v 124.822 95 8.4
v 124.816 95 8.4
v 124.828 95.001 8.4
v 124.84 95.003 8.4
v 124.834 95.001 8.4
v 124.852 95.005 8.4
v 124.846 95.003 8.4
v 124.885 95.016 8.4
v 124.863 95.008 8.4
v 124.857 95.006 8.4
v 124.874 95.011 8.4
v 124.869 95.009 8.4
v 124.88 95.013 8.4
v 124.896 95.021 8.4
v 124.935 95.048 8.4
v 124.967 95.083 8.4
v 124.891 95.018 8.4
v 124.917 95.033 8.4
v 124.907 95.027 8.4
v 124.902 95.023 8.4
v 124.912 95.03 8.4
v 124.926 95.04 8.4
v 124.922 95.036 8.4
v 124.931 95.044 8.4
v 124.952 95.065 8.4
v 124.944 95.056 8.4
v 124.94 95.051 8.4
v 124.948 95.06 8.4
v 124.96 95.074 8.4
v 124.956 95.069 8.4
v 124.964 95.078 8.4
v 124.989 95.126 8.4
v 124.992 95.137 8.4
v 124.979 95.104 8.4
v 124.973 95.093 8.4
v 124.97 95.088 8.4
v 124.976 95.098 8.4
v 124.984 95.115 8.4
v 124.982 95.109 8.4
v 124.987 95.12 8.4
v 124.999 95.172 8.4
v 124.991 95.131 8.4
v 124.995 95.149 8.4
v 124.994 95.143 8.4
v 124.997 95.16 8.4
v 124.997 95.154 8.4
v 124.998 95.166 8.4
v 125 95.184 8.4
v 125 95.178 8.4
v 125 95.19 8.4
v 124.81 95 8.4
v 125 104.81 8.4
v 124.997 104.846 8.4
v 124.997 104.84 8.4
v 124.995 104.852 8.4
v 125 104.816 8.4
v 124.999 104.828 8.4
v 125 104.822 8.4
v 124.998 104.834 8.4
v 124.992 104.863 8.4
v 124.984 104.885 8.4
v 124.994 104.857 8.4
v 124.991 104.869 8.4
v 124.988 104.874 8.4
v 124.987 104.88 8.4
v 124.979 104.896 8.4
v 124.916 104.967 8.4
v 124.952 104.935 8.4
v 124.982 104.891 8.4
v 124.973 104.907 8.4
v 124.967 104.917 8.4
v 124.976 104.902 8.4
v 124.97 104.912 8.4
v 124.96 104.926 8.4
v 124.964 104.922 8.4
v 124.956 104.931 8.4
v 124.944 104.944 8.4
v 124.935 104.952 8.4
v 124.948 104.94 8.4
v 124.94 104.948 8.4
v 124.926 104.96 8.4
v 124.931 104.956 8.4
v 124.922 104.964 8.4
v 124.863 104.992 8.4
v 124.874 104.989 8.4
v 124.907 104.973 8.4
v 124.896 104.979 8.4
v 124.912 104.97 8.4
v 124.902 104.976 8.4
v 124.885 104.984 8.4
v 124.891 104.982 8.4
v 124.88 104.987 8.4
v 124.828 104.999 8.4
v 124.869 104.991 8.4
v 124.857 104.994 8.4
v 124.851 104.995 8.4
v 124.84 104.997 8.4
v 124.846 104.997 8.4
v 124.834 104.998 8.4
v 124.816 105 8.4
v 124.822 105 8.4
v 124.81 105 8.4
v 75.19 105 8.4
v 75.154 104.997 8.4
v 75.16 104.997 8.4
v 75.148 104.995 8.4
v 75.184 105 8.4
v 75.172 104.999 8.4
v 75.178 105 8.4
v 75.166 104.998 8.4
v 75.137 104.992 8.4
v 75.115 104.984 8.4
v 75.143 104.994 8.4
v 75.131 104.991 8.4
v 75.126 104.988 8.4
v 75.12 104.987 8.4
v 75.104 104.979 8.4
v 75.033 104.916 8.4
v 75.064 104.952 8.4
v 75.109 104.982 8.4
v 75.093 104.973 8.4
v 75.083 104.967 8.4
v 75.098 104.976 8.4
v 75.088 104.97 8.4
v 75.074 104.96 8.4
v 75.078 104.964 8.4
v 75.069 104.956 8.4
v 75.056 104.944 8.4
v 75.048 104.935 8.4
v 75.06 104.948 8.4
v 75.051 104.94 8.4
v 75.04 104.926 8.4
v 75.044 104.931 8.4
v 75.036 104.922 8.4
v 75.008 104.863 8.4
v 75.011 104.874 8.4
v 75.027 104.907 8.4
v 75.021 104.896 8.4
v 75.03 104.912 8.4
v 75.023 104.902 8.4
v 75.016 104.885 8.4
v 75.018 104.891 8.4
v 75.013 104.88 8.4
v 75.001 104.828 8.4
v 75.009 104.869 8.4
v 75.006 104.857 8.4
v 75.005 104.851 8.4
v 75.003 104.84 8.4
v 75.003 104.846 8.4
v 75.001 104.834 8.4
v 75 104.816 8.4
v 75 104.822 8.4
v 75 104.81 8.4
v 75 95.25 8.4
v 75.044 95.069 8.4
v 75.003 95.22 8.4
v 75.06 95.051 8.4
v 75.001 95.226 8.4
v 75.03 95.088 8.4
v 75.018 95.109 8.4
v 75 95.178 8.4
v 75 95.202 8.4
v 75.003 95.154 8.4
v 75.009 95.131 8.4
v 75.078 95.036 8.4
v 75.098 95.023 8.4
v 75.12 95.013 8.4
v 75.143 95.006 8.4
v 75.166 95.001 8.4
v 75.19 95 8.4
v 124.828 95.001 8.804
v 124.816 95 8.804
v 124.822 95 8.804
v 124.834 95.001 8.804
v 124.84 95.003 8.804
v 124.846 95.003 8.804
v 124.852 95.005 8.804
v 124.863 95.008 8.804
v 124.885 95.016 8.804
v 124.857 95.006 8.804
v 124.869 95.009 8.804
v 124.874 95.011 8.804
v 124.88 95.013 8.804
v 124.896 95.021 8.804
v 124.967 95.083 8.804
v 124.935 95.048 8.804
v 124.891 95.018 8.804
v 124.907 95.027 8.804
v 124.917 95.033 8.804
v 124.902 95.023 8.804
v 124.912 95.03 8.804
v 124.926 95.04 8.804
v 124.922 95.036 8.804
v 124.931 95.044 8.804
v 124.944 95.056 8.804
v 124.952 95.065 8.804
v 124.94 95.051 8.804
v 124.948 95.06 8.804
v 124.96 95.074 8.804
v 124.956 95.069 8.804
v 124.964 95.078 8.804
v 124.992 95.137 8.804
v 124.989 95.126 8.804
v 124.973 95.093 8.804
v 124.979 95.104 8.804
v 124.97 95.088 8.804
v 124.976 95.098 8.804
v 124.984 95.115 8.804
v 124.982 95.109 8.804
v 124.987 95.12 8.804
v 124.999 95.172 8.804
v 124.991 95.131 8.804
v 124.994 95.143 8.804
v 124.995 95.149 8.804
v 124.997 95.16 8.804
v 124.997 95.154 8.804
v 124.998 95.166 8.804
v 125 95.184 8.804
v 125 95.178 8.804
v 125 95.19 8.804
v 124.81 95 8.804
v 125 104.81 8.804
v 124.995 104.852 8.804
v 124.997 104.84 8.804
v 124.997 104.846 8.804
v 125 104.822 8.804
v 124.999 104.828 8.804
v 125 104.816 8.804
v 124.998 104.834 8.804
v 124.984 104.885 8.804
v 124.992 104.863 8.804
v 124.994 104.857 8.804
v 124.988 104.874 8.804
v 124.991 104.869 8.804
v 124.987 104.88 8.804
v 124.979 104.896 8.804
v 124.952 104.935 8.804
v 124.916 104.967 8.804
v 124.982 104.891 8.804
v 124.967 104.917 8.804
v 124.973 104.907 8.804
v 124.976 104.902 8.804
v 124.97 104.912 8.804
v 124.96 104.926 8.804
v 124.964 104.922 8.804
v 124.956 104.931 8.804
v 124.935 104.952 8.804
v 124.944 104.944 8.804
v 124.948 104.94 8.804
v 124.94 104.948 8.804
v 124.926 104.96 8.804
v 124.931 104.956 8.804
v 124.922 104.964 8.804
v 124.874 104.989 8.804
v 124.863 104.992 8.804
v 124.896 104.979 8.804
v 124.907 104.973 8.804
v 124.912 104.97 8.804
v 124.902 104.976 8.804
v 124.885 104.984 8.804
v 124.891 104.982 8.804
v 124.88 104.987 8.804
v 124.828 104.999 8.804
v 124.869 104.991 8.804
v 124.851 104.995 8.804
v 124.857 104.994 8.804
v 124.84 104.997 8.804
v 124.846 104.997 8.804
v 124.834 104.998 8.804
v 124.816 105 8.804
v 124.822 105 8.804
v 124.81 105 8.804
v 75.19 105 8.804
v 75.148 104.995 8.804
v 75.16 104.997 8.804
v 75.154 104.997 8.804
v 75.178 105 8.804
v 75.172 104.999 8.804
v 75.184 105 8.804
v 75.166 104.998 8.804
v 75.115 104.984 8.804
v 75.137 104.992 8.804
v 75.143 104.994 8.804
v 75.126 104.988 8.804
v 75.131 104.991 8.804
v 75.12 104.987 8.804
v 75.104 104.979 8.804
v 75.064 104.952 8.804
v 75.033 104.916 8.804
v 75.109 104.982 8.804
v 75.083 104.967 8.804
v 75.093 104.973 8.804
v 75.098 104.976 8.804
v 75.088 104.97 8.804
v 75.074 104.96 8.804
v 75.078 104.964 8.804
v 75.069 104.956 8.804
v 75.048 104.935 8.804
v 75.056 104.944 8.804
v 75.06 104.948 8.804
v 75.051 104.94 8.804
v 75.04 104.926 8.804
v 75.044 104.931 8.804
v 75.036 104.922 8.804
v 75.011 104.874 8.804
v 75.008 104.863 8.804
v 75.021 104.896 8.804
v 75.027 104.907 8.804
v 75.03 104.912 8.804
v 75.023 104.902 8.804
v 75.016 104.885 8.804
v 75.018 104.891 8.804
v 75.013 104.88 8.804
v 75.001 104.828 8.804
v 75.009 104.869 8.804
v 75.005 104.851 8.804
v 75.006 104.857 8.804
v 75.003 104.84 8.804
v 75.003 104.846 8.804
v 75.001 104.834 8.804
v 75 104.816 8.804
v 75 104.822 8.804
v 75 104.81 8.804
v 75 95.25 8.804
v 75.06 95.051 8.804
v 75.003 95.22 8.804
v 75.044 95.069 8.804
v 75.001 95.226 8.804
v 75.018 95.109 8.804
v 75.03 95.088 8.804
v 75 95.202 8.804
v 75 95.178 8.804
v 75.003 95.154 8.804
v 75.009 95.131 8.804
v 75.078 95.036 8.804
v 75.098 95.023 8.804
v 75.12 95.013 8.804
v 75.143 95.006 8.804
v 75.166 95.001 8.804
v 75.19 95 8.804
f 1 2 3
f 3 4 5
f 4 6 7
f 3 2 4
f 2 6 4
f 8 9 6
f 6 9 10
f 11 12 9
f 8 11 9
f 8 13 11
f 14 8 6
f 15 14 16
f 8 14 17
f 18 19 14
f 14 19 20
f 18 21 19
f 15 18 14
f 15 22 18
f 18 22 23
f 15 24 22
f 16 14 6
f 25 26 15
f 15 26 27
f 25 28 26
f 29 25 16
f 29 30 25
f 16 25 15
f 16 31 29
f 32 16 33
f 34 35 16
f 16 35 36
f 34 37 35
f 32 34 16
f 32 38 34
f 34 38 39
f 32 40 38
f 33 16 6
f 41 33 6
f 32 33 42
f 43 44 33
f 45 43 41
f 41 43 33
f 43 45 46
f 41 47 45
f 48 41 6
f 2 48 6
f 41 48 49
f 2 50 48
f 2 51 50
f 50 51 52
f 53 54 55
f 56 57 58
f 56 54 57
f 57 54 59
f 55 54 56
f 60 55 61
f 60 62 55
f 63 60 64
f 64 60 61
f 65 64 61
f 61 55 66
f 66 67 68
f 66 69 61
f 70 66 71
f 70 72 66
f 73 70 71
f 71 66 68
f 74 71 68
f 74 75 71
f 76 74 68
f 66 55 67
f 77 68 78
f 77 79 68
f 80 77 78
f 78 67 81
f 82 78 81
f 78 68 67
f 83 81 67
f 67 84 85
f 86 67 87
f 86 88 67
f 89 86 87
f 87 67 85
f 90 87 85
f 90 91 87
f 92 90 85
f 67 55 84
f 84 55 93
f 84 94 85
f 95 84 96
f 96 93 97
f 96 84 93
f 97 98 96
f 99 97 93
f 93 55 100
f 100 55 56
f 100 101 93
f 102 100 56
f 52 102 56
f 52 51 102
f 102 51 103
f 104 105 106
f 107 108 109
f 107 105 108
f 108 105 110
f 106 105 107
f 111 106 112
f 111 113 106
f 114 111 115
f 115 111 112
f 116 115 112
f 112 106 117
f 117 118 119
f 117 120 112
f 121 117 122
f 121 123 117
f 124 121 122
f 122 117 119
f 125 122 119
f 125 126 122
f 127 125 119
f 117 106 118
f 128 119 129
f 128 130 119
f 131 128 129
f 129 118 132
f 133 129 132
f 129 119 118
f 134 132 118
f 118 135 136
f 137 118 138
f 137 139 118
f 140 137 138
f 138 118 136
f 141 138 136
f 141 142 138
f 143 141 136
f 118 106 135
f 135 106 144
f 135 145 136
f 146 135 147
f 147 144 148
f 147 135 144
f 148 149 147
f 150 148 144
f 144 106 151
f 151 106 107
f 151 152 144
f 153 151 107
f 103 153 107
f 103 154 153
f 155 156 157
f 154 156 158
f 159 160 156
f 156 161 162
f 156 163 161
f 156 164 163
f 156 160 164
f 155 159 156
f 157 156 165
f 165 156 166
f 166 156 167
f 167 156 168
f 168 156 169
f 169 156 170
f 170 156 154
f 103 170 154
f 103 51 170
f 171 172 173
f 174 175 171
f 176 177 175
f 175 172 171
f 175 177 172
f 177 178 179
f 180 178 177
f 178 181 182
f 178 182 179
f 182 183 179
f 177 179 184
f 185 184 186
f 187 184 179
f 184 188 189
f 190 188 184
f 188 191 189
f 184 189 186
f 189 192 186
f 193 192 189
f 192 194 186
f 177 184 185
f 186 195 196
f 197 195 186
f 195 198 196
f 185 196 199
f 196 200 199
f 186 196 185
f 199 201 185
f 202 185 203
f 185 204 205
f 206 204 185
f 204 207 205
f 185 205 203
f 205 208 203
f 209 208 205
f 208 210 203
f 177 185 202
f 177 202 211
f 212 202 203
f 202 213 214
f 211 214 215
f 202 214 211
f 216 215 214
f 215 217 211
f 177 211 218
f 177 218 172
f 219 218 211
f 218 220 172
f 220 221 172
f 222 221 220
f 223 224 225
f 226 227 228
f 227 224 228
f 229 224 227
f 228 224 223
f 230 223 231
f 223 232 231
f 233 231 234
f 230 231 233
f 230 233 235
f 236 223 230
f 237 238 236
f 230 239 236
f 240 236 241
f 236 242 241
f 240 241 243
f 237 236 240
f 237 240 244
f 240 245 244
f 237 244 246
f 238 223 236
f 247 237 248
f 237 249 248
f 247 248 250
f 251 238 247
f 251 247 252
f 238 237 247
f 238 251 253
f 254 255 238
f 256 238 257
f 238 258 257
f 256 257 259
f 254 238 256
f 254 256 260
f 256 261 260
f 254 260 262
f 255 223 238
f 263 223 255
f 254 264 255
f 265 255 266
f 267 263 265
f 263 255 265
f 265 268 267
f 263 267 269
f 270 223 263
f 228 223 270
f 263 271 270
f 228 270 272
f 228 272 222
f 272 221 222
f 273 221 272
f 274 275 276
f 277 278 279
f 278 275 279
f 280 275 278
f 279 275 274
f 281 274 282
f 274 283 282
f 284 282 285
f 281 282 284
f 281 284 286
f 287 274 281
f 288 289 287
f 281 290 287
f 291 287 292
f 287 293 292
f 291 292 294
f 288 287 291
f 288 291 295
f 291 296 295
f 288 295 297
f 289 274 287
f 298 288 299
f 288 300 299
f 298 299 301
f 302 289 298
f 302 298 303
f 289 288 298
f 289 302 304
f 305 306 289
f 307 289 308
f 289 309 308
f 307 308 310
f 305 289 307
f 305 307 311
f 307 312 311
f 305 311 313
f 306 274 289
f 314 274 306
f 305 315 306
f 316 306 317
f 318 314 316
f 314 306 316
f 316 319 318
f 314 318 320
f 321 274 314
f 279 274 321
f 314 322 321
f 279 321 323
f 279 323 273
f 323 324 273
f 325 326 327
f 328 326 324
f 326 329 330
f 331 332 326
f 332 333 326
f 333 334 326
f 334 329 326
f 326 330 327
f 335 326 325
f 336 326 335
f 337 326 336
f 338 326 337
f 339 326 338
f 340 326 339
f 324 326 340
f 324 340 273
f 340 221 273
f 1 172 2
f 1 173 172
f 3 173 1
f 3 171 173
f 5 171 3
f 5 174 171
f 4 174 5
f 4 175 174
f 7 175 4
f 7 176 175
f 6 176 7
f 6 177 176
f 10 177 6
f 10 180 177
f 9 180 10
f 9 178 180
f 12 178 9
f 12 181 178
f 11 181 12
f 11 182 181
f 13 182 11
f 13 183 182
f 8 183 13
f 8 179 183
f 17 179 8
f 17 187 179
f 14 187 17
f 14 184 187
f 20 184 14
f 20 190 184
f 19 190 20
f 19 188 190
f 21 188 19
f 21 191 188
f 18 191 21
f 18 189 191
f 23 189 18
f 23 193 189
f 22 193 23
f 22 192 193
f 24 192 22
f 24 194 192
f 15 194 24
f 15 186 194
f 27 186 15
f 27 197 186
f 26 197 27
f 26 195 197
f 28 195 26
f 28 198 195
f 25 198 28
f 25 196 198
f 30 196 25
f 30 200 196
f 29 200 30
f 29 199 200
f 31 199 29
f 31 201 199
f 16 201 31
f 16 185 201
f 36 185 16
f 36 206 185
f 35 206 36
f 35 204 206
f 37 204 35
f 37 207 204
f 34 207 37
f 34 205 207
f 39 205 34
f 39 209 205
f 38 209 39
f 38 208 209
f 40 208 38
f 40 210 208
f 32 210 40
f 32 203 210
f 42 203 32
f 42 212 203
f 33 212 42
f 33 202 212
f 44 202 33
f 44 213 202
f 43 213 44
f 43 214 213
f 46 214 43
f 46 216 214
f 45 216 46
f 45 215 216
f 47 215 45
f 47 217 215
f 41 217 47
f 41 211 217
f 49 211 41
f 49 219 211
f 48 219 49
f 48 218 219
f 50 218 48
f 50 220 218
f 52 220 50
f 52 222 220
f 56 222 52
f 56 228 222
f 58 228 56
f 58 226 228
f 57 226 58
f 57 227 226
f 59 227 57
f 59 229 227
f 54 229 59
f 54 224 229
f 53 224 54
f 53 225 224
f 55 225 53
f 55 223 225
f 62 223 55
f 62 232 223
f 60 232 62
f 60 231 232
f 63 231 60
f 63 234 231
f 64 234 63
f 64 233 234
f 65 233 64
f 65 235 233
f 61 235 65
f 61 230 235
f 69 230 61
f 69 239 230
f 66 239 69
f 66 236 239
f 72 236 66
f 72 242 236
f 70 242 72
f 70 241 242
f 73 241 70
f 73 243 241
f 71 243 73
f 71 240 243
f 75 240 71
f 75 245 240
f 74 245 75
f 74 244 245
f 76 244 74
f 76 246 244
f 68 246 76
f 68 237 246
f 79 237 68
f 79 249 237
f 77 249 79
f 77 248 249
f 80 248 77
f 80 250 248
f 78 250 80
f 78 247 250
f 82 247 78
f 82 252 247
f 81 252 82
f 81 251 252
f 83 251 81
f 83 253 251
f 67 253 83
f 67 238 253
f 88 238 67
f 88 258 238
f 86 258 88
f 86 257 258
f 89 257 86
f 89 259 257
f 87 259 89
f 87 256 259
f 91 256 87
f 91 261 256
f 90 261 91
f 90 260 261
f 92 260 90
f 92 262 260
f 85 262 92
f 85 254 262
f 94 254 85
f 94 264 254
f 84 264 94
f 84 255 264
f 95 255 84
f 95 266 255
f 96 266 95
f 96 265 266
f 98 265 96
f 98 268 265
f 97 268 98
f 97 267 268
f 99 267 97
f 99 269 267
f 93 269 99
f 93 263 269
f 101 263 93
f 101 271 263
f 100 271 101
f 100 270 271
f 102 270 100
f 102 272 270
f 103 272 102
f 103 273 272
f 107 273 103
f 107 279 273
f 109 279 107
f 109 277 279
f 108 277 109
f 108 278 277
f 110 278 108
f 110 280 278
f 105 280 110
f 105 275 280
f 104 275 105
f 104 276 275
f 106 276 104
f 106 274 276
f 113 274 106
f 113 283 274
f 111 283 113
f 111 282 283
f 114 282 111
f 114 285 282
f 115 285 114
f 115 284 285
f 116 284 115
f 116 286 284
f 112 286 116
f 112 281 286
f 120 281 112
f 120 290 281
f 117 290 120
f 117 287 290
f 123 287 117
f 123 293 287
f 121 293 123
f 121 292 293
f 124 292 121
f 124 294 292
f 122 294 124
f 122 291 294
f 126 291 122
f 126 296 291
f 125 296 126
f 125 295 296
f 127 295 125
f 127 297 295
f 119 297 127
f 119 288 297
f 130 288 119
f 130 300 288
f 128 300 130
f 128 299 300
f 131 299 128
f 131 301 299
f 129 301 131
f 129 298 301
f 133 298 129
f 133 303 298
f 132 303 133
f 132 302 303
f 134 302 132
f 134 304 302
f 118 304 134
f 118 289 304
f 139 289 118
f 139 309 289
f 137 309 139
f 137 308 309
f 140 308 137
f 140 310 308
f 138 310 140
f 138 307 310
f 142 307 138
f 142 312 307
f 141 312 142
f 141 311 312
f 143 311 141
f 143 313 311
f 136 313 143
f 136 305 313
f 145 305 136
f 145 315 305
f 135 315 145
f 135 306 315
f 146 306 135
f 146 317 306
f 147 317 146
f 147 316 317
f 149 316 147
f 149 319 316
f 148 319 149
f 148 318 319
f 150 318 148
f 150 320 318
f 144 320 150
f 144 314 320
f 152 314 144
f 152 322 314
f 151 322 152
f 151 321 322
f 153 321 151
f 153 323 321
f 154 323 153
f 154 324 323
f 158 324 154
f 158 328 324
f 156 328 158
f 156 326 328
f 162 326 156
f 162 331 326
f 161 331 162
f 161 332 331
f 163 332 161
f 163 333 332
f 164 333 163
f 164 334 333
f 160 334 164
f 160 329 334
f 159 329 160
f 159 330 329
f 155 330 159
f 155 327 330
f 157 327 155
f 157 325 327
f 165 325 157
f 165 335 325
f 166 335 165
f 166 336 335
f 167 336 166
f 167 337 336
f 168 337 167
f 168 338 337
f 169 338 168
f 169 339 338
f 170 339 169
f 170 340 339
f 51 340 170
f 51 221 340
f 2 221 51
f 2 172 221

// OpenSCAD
module drawBasicShape(x1, y1, x2, y2, width)
{
	length = sqrt((x1-x2)*(x1-x2) + (y1-y2)*(y1-y2));
	if (width!=0.0) {
		square(size = [width, length], center = false);
		translate([width/2.0, 0, 0]) circle(d=width);
		translate([width/2.0, length, 0]) circle(d=width);
	}
}

module translateAndRotate(x1, y1, x2, y2, width)
{
	if (width != 0.0) {
		angle = atan((y2-y1)/(x2-x1)) +270;
		if (x2>=x1) {
			translate([x1, y1, 0.0]) rotate([0.0, 0.0, angle]) translate([-width/2.0, 0.0, 0.0]) scale([1.0, 1.0, 1.0]) drawBasicShape(x1, y1, x2, y2, width);
		}
		else {
			translate([x1, y1, 0.0]) rotate([0.0, 0.0, angle+180]) translate([-width/2.0, 0.0, 0.0]) scale([1.0, 1.0, 1.0]) drawBasicShape(x1, y1, x2, y2, width);		}
	}
}

$fn=50;

points20 = [
[75.77800000, 95.77800000, 0.00000000],
[124.22200000, 95.77800000, 0.37999548],
[124.22200000, 104.22200000, 0.37997788],
[75.77800000, 104.22200000, 0.37999672],
[75.77800000, 95.83800000, 0.37997423],
[75.48400000, 95.48400000, 0.00000000],
[124.51600000, 95.48400000, 0.37999868],
[124.51600000, 104.51600000, 0.37998977],
[75.48400000, 104.51600000, 0.37999746],
[75.48400000, 95.54400000, 0.37999314],
[75.19000000, 95.19000000, 0.00000000],
[124.81000000, 95.19000000, 0.37999939],
[124.81000000, 104.81000000, 0.38000021],
[75.19000000, 104.81000000, 0.38000060],
[75.19000000, 95.25000000, 0.37999715],
[75.53600000, 95.39000000, 0.00000000],
[75.94600000, 103.88900000, 0.00000000],
[76.11100000, 104.05400000, 0.37961375],
[76.52800000, 104.05400000, 0.38001190],
[75.94600000, 103.47200000, 0.37989934],
[75.94600000, 103.05500000, 0.38015610],
[76.94500000, 104.05400000, 0.37994651],
[77.36200000, 104.05400000, 0.38001190],
[75.94600000, 102.63800000, 0.37999592],
[75.94600000, 102.22100000, 0.38001190],
[77.77900000, 104.05400000, 0.37999966],
[78.19600000, 104.05400000, 0.38015610],
[75.94600000, 101.80400000, 0.38000201],
[75.94600000, 101.38700000, 0.38001190],
[78.61300000, 104.05400000, 0.38001957],
[79.03000000, 104.05400000, 0.38001190],
[75.94600000, 100.97000000, 0.38001859],
[75.94600000, 100.55300000, 0.38001190],
[79.44700000, 104.05400000, 0.38002999],
[79.86400000, 104.05400000, 0.38001190],
[75.94600000, 100.13600000, 0.38002811],
[75.94600000, 99.71900000, 0.38001190],
[80.28100000, 104.05400000, 0.38002660],
[80.69800000, 104.05400000, 0.38001190],
[75.94600000, 99.30200000, 0.38003429],
[75.94600000, 98.88500000, 0.38001190],
[81.11500000, 104.05400000, 0.38003252],
[81.53300000, 104.05400000, 0.37930814],
[75.94600000, 98.46700000, 0.37997836],
[75.94600000, 98.05000000, 0.38001190],
[81.95000000, 104.05400000, 0.37998072],
[82.36700000, 104.05400000, 0.38015610],
[75.94600000, 97.63300000, 0.37998277],
[75.94600000, 97.21600000, 0.38015610],
[82.78400000, 104.05400000, 0.37999079],
[83.20100000, 104.05400000, 0.38001190],
[75.94600000, 96.79900000, 0.37999203],
[75.94600000, 96.38200000, 0.38001190],
[83.61800000, 104.05400000, 0.37999868],
[84.03500000, 104.05400000, 0.38001190],
[75.95600000, 95.97600000, 0.38000275],
[76.34400000, 95.94600000, 0.37958004],
[84.45200000, 104.05400000, 0.38000754],
[84.86900000, 104.05400000, 0.38001190],
[76.76100000, 95.94600000, 0.38000229],
[77.17800000, 95.94600000, 0.38001190],
[85.28600000, 104.05400000, 0.38000754],
[85.70300000, 104.05400000, 0.38001190],
[77.59500000, 95.94600000, 0.38000229],
[78.01200000, 95.94600000, 0.38015610],
[86.12000000, 104.05400000, 0.38000229],
[86.53700000, 104.05400000, 0.38001190],
[78.42900000, 95.94600000, 0.38000754],
[78.84600000, 95.94600000, 0.38001190],
[86.95400000, 104.05400000, 0.38000229],
[87.37100000, 104.05400000, 0.38001190],
[79.26300000, 95.94600000, 0.38000754],
[79.68000000, 95.94600000, 0.38001190],
[87.78900000, 104.05400000, 0.37998415],
[88.20600000, 104.05400000, 0.38015610],
[80.09700000, 95.94600000, 0.37998415],
[80.51500000, 95.94600000, 0.37930814],
[88.62300000, 104.05400000, 0.38000754],
[89.04000000, 104.05400000, 0.38001190],
[80.93200000, 95.94600000, 0.38000229],
[81.34900000, 95.94600000, 0.38001190],
[89.45700000, 104.05400000, 0.38000754],
[89.87400000, 104.05400000, 0.38001190],
[81.76600000, 95.94600000, 0.38000229],
[82.18300000, 95.94600000, 0.38015610],
[90.29100000, 104.05400000, 0.38000229],
[90.70800000, 104.05400000, 0.38001190],
[82.60000000, 95.94600000, 0.38000754],
[83.01700000, 95.94600000, 0.38001190],
[91.12500000, 104.05400000, 0.38000229],
[91.54200000, 104.05400000, 0.38001190],
[83.43400000, 95.94600000, 0.38000754],
[83.85100000, 95.94600000, 0.38001190],
[91.95900000, 104.05400000, 0.38000229],
[92.37600000, 104.05400000, 0.38015610],
[84.26800000, 95.94600000, 0.38000229],
[84.68500000, 95.94600000, 0.38001190],
[92.79300000, 104.05400000, 0.38000754],
[93.21000000, 104.05400000, 0.38001190],
[85.10200000, 95.94600000, 0.38000229],
[85.51900000, 95.94600000, 0.38001190],
[93.62700000, 104.05400000, 0.38000754],
[94.04400000, 104.05400000, 0.38001190],
[85.93600000, 95.94600000, 0.38000229],
[86.35300000, 95.94600000, 0.38015610],
[94.46200000, 104.05400000, 0.37998415],
[94.87900000, 104.05400000, 0.38001190],
[86.77000000, 95.94600000, 0.37998940],
[87.18800000, 95.94600000, 0.37930814],
[95.29600000, 104.05400000, 0.38000229],
[95.71300000, 104.05400000, 0.38001190],
[87.60500000, 95.94600000, 0.38000754],
[88.02200000, 95.94600000, 0.38001190],
[96.13000000, 104.05400000, 0.38000229],
[96.54700000, 104.05400000, 0.38015610],
[88.43900000, 95.94600000, 0.38000229],
[88.85600000, 95.94600000, 0.38001190],
[96.96400000, 104.05400000, 0.38000754],
[97.38100000, 104.05400000, 0.38001190],
[89.27300000, 95.94600000, 0.38000229],
[89.69000000, 95.94600000, 0.38001190],
[97.79800000, 104.05400000, 0.38000754],
[98.21500000, 104.05400000, 0.38001190],
[90.10700000, 95.94600000, 0.38000229],
[90.52400000, 95.94600000, 0.38015610],
[98.63200000, 104.05400000, 0.38000229],
[99.04900000, 104.05400000, 0.38001190],
[90.94100000, 95.94600000, 0.38000229],
[91.35800000, 95.94600000, 0.38015610],
[99.46600000, 104.05400000, 0.38000229],
[99.88300000, 104.05400000, 0.38001190],
[91.77500000, 95.94600000, 0.38000754],
[92.19200000, 95.94600000, 0.38001190],
[100.30000000, 104.05400000, 0.38000229],
[100.71800000, 104.05400000, 0.37945200],
[92.60900000, 95.94600000, 0.37998415],
[93.02600000, 95.94600000, 0.38001190],
[101.13500000, 104.05400000, 0.37998415],
[101.55200000, 104.05400000, 0.38015610],
[93.44400000, 95.94600000, 0.38000229],
[93.86100000, 95.94600000, 0.38001190],
[101.96900000, 104.05400000, 0.38000754],
[102.38600000, 104.05400000, 0.38001190],
[94.27800000, 95.94600000, 0.38000229],
[94.69500000, 95.94600000, 0.38001190],
[102.80300000, 104.05400000, 0.38000754],
[103.22000000, 104.05400000, 0.38001190],
[95.11200000, 95.94600000, 0.38000229],
[95.52900000, 95.94600000, 0.38015610],
[103.63700000, 104.05400000, 0.38000229],
[104.05400000, 104.05400000, 0.38001190],
[95.94600000, 95.94600000, 0.38000754],
[96.36300000, 95.94600000, 0.38001190],
[104.47100000, 104.05400000, 0.38000229],
[104.88800000, 104.05400000, 0.38001190],
[96.78000000, 95.94600000, 0.38000754],
[97.19700000, 95.94600000, 0.38001190],
[105.30500000, 104.05400000, 0.38000229],
[105.72200000, 104.05400000, 0.38015610],
[97.61400000, 95.94600000, 0.38000229],
[98.03100000, 95.94600000, 0.38001190],
[106.13900000, 104.05400000, 0.38000754],
[106.55600000, 104.05400000, 0.38001190],
[98.44800000, 95.94600000, 0.38000229],
[98.86500000, 95.94600000, 0.38001190],
[106.97300000, 104.05400000, 0.38000754],
[107.39100000, 104.05400000, 0.37930814],
[99.28200000, 95.94600000, 0.37998415],
[99.69900000, 95.94600000, 0.38015610],
[107.80800000, 104.05400000, 0.37998415],
[108.22500000, 104.05400000, 0.38001190],
[100.11700000, 95.94600000, 0.38000754],
[100.53400000, 95.94600000, 0.38001190],
[108.64200000, 104.05400000, 0.38000229],
[109.05900000, 104.05400000, 0.38001190],
[100.95100000, 95.94600000, 0.38000754],
[101.36800000, 95.94600000, 0.38001190],
[109.47600000, 104.05400000, 0.38000229],
[109.89300000, 104.05400000, 0.38015610],
[101.78500000, 95.94600000, 0.38000229],
[102.20200000, 95.94600000, 0.38001190],
[110.31000000, 104.05400000, 0.38000754],
[110.72700000, 104.05400000, 0.38001190],
[102.61900000, 95.94600000, 0.38000229],
[103.03600000, 95.94600000, 0.38001190],
[111.14400000, 104.05400000, 0.38000754],
[111.56100000, 104.05400000, 0.38001190],
[103.45300000, 95.94600000, 0.38000229],
[103.87000000, 95.94600000, 0.38015610],
[111.97800000, 104.05400000, 0.38000229],
[112.39500000, 104.05400000, 0.38001190],
[104.28700000, 95.94600000, 0.38000229],
[104.70400000, 95.94600000, 0.38015610],
[112.81200000, 104.05400000, 0.38000229],
[113.22900000, 104.05400000, 0.38001190],
[105.12100000, 95.94600000, 0.38000754],
[105.53800000, 95.94600000, 0.38001190],
[113.64700000, 104.05400000, 0.37998415],
[114.06400000, 104.05400000, 0.38001190],
[105.95500000, 95.94600000, 0.37998940],
[106.37300000, 95.94600000, 0.37930814],
[114.48100000, 104.05400000, 0.38000229],
[114.89800000, 104.05400000, 0.38015610],
[106.79000000, 95.94600000, 0.38000229],
[107.20700000, 95.94600000, 0.38001190],
[115.31500000, 104.05400000, 0.38000754],
[115.73200000, 104.05400000, 0.38001190],
[107.62400000, 95.94600000, 0.38000229],
[108.04100000, 95.94600000, 0.38001190],
[116.14900000, 104.05400000, 0.38000754],
[116.56600000, 104.05400000, 0.38001190],
[108.45800000, 95.94600000, 0.38000229],
[108.87500000, 95.94600000, 0.38015610],
[116.98300000, 104.05400000, 0.38000229],
[117.40000000, 104.05400000, 0.38001190],
[109.29200000, 95.94600000, 0.38000754],
[109.70900000, 95.94600000, 0.38001190],
[117.81700000, 104.05400000, 0.38000229],
[118.23400000, 104.05400000, 0.38001190],
[110.12600000, 95.94600000, 0.38000754],
[110.54300000, 95.94600000, 0.38001190],
[118.65100000, 104.05400000, 0.38000229],
[119.06800000, 104.05400000, 0.38015610],
[110.96000000, 95.94600000, 0.38000229],
[111.37700000, 95.94600000, 0.38001190],
[119.48500000, 104.05400000, 0.38000754],
[119.90200000, 104.05400000, 0.38001190],
[111.79400000, 95.94600000, 0.38000229],
[112.21100000, 95.94600000, 0.38001190],
[120.32000000, 104.05400000, 0.37998940],
[120.73700000, 104.05400000, 0.38001190],
[112.62900000, 95.94600000, 0.38000229],
[113.04600000, 95.94600000, 0.38015610],
[121.15400000, 104.05400000, 0.38000229],
[121.57100000, 104.05400000, 0.38001190],
[113.46300000, 95.94600000, 0.38000229],
[113.88000000, 95.94600000, 0.38015610],
[121.98800000, 104.05400000, 0.38000229],
[122.40500000, 104.05400000, 0.38001190],
[114.29700000, 95.94600000, 0.38000754],
[114.71400000, 95.94600000, 0.38001190],
[122.82200000, 104.05400000, 0.38000229],
[123.23900000, 104.05400000, 0.38001190],
[115.13100000, 95.94600000, 0.38000754],
[115.54800000, 95.94600000, 0.38001190],
[123.65600000, 104.05400000, 0.38000229],
[124.04400000, 104.02500000, 0.37979183],
[115.96500000, 95.94600000, 0.37998455],
[116.38200000, 95.94600000, 0.38001190],
[124.05400000, 103.61800000, 0.37999868],
[124.05400000, 103.20100000, 0.38001190],
[116.79900000, 95.94600000, 0.37999789],
[117.21600000, 95.94600000, 0.38001190],
[124.05400000, 102.78400000, 0.37999079],
[124.05400000, 102.36700000, 0.38015610],
[117.63300000, 95.94600000, 0.37998939],
[118.05000000, 95.94600000, 0.38001190],
[124.05400000, 101.95000000, 0.37998780],
[124.05400000, 101.53300000, 0.38001190],
[118.46700000, 95.94600000, 0.37997836],
[118.88400000, 95.94600000, 0.38001190],
[124.05400000, 101.11600000, 0.37998384],
[124.05400000, 100.69800000, 0.37930814],
[119.30200000, 95.94600000, 0.38002534],
[119.71900000, 95.94600000, 0.38015610],
[124.05400000, 100.28100000, 0.38002660],
[124.05400000, 99.86400000, 0.38001190],
[120.13600000, 95.94600000, 0.38002811],
[120.55300000, 95.94600000, 0.38015610],
[124.05400000, 99.44700000, 0.38001785],
[124.05400000, 99.03000000, 0.38015610],
[120.97000000, 95.94600000, 0.38001859],
[121.38700000, 95.94600000, 0.38001190],
[124.05400000, 98.61300000, 0.38001957],
[124.05400000, 98.19600000, 0.38015610],
[121.80400000, 95.94600000, 0.38000201],
[122.22100000, 95.94600000, 0.38015610],
[124.05400000, 97.77900000, 0.37999966],
[124.05400000, 97.36200000, 0.38001190],
[122.63800000, 95.94600000, 0.37999592],
[123.05500000, 95.94600000, 0.38015610],
[124.05400000, 96.94500000, 0.37994651],
[124.05400000, 96.52800000, 0.38015610],
[123.47200000, 95.94600000, 0.37989934],
[123.88900000, 95.94600000, 0.38001190],
[124.05400000, 96.11100000, 0.37961375],
];

translate([0.0, 0.0, 8.40000000]) {
	linear_extrude(height = 0.40400000, center = false, convexity = 10, twist = 0) {
		union() {
			for( i=[0:len(points20)-2] ){ 
				x1 = points20[i][0];
				y1 = points20[i][1];
				x2 = points20[i+1][0];
				y2 = points20[i+1][1];
				width = points20[i+1][2];
				translateAndRotate(x1, y1, x2, y2, width);
			}
		}
	}
}
